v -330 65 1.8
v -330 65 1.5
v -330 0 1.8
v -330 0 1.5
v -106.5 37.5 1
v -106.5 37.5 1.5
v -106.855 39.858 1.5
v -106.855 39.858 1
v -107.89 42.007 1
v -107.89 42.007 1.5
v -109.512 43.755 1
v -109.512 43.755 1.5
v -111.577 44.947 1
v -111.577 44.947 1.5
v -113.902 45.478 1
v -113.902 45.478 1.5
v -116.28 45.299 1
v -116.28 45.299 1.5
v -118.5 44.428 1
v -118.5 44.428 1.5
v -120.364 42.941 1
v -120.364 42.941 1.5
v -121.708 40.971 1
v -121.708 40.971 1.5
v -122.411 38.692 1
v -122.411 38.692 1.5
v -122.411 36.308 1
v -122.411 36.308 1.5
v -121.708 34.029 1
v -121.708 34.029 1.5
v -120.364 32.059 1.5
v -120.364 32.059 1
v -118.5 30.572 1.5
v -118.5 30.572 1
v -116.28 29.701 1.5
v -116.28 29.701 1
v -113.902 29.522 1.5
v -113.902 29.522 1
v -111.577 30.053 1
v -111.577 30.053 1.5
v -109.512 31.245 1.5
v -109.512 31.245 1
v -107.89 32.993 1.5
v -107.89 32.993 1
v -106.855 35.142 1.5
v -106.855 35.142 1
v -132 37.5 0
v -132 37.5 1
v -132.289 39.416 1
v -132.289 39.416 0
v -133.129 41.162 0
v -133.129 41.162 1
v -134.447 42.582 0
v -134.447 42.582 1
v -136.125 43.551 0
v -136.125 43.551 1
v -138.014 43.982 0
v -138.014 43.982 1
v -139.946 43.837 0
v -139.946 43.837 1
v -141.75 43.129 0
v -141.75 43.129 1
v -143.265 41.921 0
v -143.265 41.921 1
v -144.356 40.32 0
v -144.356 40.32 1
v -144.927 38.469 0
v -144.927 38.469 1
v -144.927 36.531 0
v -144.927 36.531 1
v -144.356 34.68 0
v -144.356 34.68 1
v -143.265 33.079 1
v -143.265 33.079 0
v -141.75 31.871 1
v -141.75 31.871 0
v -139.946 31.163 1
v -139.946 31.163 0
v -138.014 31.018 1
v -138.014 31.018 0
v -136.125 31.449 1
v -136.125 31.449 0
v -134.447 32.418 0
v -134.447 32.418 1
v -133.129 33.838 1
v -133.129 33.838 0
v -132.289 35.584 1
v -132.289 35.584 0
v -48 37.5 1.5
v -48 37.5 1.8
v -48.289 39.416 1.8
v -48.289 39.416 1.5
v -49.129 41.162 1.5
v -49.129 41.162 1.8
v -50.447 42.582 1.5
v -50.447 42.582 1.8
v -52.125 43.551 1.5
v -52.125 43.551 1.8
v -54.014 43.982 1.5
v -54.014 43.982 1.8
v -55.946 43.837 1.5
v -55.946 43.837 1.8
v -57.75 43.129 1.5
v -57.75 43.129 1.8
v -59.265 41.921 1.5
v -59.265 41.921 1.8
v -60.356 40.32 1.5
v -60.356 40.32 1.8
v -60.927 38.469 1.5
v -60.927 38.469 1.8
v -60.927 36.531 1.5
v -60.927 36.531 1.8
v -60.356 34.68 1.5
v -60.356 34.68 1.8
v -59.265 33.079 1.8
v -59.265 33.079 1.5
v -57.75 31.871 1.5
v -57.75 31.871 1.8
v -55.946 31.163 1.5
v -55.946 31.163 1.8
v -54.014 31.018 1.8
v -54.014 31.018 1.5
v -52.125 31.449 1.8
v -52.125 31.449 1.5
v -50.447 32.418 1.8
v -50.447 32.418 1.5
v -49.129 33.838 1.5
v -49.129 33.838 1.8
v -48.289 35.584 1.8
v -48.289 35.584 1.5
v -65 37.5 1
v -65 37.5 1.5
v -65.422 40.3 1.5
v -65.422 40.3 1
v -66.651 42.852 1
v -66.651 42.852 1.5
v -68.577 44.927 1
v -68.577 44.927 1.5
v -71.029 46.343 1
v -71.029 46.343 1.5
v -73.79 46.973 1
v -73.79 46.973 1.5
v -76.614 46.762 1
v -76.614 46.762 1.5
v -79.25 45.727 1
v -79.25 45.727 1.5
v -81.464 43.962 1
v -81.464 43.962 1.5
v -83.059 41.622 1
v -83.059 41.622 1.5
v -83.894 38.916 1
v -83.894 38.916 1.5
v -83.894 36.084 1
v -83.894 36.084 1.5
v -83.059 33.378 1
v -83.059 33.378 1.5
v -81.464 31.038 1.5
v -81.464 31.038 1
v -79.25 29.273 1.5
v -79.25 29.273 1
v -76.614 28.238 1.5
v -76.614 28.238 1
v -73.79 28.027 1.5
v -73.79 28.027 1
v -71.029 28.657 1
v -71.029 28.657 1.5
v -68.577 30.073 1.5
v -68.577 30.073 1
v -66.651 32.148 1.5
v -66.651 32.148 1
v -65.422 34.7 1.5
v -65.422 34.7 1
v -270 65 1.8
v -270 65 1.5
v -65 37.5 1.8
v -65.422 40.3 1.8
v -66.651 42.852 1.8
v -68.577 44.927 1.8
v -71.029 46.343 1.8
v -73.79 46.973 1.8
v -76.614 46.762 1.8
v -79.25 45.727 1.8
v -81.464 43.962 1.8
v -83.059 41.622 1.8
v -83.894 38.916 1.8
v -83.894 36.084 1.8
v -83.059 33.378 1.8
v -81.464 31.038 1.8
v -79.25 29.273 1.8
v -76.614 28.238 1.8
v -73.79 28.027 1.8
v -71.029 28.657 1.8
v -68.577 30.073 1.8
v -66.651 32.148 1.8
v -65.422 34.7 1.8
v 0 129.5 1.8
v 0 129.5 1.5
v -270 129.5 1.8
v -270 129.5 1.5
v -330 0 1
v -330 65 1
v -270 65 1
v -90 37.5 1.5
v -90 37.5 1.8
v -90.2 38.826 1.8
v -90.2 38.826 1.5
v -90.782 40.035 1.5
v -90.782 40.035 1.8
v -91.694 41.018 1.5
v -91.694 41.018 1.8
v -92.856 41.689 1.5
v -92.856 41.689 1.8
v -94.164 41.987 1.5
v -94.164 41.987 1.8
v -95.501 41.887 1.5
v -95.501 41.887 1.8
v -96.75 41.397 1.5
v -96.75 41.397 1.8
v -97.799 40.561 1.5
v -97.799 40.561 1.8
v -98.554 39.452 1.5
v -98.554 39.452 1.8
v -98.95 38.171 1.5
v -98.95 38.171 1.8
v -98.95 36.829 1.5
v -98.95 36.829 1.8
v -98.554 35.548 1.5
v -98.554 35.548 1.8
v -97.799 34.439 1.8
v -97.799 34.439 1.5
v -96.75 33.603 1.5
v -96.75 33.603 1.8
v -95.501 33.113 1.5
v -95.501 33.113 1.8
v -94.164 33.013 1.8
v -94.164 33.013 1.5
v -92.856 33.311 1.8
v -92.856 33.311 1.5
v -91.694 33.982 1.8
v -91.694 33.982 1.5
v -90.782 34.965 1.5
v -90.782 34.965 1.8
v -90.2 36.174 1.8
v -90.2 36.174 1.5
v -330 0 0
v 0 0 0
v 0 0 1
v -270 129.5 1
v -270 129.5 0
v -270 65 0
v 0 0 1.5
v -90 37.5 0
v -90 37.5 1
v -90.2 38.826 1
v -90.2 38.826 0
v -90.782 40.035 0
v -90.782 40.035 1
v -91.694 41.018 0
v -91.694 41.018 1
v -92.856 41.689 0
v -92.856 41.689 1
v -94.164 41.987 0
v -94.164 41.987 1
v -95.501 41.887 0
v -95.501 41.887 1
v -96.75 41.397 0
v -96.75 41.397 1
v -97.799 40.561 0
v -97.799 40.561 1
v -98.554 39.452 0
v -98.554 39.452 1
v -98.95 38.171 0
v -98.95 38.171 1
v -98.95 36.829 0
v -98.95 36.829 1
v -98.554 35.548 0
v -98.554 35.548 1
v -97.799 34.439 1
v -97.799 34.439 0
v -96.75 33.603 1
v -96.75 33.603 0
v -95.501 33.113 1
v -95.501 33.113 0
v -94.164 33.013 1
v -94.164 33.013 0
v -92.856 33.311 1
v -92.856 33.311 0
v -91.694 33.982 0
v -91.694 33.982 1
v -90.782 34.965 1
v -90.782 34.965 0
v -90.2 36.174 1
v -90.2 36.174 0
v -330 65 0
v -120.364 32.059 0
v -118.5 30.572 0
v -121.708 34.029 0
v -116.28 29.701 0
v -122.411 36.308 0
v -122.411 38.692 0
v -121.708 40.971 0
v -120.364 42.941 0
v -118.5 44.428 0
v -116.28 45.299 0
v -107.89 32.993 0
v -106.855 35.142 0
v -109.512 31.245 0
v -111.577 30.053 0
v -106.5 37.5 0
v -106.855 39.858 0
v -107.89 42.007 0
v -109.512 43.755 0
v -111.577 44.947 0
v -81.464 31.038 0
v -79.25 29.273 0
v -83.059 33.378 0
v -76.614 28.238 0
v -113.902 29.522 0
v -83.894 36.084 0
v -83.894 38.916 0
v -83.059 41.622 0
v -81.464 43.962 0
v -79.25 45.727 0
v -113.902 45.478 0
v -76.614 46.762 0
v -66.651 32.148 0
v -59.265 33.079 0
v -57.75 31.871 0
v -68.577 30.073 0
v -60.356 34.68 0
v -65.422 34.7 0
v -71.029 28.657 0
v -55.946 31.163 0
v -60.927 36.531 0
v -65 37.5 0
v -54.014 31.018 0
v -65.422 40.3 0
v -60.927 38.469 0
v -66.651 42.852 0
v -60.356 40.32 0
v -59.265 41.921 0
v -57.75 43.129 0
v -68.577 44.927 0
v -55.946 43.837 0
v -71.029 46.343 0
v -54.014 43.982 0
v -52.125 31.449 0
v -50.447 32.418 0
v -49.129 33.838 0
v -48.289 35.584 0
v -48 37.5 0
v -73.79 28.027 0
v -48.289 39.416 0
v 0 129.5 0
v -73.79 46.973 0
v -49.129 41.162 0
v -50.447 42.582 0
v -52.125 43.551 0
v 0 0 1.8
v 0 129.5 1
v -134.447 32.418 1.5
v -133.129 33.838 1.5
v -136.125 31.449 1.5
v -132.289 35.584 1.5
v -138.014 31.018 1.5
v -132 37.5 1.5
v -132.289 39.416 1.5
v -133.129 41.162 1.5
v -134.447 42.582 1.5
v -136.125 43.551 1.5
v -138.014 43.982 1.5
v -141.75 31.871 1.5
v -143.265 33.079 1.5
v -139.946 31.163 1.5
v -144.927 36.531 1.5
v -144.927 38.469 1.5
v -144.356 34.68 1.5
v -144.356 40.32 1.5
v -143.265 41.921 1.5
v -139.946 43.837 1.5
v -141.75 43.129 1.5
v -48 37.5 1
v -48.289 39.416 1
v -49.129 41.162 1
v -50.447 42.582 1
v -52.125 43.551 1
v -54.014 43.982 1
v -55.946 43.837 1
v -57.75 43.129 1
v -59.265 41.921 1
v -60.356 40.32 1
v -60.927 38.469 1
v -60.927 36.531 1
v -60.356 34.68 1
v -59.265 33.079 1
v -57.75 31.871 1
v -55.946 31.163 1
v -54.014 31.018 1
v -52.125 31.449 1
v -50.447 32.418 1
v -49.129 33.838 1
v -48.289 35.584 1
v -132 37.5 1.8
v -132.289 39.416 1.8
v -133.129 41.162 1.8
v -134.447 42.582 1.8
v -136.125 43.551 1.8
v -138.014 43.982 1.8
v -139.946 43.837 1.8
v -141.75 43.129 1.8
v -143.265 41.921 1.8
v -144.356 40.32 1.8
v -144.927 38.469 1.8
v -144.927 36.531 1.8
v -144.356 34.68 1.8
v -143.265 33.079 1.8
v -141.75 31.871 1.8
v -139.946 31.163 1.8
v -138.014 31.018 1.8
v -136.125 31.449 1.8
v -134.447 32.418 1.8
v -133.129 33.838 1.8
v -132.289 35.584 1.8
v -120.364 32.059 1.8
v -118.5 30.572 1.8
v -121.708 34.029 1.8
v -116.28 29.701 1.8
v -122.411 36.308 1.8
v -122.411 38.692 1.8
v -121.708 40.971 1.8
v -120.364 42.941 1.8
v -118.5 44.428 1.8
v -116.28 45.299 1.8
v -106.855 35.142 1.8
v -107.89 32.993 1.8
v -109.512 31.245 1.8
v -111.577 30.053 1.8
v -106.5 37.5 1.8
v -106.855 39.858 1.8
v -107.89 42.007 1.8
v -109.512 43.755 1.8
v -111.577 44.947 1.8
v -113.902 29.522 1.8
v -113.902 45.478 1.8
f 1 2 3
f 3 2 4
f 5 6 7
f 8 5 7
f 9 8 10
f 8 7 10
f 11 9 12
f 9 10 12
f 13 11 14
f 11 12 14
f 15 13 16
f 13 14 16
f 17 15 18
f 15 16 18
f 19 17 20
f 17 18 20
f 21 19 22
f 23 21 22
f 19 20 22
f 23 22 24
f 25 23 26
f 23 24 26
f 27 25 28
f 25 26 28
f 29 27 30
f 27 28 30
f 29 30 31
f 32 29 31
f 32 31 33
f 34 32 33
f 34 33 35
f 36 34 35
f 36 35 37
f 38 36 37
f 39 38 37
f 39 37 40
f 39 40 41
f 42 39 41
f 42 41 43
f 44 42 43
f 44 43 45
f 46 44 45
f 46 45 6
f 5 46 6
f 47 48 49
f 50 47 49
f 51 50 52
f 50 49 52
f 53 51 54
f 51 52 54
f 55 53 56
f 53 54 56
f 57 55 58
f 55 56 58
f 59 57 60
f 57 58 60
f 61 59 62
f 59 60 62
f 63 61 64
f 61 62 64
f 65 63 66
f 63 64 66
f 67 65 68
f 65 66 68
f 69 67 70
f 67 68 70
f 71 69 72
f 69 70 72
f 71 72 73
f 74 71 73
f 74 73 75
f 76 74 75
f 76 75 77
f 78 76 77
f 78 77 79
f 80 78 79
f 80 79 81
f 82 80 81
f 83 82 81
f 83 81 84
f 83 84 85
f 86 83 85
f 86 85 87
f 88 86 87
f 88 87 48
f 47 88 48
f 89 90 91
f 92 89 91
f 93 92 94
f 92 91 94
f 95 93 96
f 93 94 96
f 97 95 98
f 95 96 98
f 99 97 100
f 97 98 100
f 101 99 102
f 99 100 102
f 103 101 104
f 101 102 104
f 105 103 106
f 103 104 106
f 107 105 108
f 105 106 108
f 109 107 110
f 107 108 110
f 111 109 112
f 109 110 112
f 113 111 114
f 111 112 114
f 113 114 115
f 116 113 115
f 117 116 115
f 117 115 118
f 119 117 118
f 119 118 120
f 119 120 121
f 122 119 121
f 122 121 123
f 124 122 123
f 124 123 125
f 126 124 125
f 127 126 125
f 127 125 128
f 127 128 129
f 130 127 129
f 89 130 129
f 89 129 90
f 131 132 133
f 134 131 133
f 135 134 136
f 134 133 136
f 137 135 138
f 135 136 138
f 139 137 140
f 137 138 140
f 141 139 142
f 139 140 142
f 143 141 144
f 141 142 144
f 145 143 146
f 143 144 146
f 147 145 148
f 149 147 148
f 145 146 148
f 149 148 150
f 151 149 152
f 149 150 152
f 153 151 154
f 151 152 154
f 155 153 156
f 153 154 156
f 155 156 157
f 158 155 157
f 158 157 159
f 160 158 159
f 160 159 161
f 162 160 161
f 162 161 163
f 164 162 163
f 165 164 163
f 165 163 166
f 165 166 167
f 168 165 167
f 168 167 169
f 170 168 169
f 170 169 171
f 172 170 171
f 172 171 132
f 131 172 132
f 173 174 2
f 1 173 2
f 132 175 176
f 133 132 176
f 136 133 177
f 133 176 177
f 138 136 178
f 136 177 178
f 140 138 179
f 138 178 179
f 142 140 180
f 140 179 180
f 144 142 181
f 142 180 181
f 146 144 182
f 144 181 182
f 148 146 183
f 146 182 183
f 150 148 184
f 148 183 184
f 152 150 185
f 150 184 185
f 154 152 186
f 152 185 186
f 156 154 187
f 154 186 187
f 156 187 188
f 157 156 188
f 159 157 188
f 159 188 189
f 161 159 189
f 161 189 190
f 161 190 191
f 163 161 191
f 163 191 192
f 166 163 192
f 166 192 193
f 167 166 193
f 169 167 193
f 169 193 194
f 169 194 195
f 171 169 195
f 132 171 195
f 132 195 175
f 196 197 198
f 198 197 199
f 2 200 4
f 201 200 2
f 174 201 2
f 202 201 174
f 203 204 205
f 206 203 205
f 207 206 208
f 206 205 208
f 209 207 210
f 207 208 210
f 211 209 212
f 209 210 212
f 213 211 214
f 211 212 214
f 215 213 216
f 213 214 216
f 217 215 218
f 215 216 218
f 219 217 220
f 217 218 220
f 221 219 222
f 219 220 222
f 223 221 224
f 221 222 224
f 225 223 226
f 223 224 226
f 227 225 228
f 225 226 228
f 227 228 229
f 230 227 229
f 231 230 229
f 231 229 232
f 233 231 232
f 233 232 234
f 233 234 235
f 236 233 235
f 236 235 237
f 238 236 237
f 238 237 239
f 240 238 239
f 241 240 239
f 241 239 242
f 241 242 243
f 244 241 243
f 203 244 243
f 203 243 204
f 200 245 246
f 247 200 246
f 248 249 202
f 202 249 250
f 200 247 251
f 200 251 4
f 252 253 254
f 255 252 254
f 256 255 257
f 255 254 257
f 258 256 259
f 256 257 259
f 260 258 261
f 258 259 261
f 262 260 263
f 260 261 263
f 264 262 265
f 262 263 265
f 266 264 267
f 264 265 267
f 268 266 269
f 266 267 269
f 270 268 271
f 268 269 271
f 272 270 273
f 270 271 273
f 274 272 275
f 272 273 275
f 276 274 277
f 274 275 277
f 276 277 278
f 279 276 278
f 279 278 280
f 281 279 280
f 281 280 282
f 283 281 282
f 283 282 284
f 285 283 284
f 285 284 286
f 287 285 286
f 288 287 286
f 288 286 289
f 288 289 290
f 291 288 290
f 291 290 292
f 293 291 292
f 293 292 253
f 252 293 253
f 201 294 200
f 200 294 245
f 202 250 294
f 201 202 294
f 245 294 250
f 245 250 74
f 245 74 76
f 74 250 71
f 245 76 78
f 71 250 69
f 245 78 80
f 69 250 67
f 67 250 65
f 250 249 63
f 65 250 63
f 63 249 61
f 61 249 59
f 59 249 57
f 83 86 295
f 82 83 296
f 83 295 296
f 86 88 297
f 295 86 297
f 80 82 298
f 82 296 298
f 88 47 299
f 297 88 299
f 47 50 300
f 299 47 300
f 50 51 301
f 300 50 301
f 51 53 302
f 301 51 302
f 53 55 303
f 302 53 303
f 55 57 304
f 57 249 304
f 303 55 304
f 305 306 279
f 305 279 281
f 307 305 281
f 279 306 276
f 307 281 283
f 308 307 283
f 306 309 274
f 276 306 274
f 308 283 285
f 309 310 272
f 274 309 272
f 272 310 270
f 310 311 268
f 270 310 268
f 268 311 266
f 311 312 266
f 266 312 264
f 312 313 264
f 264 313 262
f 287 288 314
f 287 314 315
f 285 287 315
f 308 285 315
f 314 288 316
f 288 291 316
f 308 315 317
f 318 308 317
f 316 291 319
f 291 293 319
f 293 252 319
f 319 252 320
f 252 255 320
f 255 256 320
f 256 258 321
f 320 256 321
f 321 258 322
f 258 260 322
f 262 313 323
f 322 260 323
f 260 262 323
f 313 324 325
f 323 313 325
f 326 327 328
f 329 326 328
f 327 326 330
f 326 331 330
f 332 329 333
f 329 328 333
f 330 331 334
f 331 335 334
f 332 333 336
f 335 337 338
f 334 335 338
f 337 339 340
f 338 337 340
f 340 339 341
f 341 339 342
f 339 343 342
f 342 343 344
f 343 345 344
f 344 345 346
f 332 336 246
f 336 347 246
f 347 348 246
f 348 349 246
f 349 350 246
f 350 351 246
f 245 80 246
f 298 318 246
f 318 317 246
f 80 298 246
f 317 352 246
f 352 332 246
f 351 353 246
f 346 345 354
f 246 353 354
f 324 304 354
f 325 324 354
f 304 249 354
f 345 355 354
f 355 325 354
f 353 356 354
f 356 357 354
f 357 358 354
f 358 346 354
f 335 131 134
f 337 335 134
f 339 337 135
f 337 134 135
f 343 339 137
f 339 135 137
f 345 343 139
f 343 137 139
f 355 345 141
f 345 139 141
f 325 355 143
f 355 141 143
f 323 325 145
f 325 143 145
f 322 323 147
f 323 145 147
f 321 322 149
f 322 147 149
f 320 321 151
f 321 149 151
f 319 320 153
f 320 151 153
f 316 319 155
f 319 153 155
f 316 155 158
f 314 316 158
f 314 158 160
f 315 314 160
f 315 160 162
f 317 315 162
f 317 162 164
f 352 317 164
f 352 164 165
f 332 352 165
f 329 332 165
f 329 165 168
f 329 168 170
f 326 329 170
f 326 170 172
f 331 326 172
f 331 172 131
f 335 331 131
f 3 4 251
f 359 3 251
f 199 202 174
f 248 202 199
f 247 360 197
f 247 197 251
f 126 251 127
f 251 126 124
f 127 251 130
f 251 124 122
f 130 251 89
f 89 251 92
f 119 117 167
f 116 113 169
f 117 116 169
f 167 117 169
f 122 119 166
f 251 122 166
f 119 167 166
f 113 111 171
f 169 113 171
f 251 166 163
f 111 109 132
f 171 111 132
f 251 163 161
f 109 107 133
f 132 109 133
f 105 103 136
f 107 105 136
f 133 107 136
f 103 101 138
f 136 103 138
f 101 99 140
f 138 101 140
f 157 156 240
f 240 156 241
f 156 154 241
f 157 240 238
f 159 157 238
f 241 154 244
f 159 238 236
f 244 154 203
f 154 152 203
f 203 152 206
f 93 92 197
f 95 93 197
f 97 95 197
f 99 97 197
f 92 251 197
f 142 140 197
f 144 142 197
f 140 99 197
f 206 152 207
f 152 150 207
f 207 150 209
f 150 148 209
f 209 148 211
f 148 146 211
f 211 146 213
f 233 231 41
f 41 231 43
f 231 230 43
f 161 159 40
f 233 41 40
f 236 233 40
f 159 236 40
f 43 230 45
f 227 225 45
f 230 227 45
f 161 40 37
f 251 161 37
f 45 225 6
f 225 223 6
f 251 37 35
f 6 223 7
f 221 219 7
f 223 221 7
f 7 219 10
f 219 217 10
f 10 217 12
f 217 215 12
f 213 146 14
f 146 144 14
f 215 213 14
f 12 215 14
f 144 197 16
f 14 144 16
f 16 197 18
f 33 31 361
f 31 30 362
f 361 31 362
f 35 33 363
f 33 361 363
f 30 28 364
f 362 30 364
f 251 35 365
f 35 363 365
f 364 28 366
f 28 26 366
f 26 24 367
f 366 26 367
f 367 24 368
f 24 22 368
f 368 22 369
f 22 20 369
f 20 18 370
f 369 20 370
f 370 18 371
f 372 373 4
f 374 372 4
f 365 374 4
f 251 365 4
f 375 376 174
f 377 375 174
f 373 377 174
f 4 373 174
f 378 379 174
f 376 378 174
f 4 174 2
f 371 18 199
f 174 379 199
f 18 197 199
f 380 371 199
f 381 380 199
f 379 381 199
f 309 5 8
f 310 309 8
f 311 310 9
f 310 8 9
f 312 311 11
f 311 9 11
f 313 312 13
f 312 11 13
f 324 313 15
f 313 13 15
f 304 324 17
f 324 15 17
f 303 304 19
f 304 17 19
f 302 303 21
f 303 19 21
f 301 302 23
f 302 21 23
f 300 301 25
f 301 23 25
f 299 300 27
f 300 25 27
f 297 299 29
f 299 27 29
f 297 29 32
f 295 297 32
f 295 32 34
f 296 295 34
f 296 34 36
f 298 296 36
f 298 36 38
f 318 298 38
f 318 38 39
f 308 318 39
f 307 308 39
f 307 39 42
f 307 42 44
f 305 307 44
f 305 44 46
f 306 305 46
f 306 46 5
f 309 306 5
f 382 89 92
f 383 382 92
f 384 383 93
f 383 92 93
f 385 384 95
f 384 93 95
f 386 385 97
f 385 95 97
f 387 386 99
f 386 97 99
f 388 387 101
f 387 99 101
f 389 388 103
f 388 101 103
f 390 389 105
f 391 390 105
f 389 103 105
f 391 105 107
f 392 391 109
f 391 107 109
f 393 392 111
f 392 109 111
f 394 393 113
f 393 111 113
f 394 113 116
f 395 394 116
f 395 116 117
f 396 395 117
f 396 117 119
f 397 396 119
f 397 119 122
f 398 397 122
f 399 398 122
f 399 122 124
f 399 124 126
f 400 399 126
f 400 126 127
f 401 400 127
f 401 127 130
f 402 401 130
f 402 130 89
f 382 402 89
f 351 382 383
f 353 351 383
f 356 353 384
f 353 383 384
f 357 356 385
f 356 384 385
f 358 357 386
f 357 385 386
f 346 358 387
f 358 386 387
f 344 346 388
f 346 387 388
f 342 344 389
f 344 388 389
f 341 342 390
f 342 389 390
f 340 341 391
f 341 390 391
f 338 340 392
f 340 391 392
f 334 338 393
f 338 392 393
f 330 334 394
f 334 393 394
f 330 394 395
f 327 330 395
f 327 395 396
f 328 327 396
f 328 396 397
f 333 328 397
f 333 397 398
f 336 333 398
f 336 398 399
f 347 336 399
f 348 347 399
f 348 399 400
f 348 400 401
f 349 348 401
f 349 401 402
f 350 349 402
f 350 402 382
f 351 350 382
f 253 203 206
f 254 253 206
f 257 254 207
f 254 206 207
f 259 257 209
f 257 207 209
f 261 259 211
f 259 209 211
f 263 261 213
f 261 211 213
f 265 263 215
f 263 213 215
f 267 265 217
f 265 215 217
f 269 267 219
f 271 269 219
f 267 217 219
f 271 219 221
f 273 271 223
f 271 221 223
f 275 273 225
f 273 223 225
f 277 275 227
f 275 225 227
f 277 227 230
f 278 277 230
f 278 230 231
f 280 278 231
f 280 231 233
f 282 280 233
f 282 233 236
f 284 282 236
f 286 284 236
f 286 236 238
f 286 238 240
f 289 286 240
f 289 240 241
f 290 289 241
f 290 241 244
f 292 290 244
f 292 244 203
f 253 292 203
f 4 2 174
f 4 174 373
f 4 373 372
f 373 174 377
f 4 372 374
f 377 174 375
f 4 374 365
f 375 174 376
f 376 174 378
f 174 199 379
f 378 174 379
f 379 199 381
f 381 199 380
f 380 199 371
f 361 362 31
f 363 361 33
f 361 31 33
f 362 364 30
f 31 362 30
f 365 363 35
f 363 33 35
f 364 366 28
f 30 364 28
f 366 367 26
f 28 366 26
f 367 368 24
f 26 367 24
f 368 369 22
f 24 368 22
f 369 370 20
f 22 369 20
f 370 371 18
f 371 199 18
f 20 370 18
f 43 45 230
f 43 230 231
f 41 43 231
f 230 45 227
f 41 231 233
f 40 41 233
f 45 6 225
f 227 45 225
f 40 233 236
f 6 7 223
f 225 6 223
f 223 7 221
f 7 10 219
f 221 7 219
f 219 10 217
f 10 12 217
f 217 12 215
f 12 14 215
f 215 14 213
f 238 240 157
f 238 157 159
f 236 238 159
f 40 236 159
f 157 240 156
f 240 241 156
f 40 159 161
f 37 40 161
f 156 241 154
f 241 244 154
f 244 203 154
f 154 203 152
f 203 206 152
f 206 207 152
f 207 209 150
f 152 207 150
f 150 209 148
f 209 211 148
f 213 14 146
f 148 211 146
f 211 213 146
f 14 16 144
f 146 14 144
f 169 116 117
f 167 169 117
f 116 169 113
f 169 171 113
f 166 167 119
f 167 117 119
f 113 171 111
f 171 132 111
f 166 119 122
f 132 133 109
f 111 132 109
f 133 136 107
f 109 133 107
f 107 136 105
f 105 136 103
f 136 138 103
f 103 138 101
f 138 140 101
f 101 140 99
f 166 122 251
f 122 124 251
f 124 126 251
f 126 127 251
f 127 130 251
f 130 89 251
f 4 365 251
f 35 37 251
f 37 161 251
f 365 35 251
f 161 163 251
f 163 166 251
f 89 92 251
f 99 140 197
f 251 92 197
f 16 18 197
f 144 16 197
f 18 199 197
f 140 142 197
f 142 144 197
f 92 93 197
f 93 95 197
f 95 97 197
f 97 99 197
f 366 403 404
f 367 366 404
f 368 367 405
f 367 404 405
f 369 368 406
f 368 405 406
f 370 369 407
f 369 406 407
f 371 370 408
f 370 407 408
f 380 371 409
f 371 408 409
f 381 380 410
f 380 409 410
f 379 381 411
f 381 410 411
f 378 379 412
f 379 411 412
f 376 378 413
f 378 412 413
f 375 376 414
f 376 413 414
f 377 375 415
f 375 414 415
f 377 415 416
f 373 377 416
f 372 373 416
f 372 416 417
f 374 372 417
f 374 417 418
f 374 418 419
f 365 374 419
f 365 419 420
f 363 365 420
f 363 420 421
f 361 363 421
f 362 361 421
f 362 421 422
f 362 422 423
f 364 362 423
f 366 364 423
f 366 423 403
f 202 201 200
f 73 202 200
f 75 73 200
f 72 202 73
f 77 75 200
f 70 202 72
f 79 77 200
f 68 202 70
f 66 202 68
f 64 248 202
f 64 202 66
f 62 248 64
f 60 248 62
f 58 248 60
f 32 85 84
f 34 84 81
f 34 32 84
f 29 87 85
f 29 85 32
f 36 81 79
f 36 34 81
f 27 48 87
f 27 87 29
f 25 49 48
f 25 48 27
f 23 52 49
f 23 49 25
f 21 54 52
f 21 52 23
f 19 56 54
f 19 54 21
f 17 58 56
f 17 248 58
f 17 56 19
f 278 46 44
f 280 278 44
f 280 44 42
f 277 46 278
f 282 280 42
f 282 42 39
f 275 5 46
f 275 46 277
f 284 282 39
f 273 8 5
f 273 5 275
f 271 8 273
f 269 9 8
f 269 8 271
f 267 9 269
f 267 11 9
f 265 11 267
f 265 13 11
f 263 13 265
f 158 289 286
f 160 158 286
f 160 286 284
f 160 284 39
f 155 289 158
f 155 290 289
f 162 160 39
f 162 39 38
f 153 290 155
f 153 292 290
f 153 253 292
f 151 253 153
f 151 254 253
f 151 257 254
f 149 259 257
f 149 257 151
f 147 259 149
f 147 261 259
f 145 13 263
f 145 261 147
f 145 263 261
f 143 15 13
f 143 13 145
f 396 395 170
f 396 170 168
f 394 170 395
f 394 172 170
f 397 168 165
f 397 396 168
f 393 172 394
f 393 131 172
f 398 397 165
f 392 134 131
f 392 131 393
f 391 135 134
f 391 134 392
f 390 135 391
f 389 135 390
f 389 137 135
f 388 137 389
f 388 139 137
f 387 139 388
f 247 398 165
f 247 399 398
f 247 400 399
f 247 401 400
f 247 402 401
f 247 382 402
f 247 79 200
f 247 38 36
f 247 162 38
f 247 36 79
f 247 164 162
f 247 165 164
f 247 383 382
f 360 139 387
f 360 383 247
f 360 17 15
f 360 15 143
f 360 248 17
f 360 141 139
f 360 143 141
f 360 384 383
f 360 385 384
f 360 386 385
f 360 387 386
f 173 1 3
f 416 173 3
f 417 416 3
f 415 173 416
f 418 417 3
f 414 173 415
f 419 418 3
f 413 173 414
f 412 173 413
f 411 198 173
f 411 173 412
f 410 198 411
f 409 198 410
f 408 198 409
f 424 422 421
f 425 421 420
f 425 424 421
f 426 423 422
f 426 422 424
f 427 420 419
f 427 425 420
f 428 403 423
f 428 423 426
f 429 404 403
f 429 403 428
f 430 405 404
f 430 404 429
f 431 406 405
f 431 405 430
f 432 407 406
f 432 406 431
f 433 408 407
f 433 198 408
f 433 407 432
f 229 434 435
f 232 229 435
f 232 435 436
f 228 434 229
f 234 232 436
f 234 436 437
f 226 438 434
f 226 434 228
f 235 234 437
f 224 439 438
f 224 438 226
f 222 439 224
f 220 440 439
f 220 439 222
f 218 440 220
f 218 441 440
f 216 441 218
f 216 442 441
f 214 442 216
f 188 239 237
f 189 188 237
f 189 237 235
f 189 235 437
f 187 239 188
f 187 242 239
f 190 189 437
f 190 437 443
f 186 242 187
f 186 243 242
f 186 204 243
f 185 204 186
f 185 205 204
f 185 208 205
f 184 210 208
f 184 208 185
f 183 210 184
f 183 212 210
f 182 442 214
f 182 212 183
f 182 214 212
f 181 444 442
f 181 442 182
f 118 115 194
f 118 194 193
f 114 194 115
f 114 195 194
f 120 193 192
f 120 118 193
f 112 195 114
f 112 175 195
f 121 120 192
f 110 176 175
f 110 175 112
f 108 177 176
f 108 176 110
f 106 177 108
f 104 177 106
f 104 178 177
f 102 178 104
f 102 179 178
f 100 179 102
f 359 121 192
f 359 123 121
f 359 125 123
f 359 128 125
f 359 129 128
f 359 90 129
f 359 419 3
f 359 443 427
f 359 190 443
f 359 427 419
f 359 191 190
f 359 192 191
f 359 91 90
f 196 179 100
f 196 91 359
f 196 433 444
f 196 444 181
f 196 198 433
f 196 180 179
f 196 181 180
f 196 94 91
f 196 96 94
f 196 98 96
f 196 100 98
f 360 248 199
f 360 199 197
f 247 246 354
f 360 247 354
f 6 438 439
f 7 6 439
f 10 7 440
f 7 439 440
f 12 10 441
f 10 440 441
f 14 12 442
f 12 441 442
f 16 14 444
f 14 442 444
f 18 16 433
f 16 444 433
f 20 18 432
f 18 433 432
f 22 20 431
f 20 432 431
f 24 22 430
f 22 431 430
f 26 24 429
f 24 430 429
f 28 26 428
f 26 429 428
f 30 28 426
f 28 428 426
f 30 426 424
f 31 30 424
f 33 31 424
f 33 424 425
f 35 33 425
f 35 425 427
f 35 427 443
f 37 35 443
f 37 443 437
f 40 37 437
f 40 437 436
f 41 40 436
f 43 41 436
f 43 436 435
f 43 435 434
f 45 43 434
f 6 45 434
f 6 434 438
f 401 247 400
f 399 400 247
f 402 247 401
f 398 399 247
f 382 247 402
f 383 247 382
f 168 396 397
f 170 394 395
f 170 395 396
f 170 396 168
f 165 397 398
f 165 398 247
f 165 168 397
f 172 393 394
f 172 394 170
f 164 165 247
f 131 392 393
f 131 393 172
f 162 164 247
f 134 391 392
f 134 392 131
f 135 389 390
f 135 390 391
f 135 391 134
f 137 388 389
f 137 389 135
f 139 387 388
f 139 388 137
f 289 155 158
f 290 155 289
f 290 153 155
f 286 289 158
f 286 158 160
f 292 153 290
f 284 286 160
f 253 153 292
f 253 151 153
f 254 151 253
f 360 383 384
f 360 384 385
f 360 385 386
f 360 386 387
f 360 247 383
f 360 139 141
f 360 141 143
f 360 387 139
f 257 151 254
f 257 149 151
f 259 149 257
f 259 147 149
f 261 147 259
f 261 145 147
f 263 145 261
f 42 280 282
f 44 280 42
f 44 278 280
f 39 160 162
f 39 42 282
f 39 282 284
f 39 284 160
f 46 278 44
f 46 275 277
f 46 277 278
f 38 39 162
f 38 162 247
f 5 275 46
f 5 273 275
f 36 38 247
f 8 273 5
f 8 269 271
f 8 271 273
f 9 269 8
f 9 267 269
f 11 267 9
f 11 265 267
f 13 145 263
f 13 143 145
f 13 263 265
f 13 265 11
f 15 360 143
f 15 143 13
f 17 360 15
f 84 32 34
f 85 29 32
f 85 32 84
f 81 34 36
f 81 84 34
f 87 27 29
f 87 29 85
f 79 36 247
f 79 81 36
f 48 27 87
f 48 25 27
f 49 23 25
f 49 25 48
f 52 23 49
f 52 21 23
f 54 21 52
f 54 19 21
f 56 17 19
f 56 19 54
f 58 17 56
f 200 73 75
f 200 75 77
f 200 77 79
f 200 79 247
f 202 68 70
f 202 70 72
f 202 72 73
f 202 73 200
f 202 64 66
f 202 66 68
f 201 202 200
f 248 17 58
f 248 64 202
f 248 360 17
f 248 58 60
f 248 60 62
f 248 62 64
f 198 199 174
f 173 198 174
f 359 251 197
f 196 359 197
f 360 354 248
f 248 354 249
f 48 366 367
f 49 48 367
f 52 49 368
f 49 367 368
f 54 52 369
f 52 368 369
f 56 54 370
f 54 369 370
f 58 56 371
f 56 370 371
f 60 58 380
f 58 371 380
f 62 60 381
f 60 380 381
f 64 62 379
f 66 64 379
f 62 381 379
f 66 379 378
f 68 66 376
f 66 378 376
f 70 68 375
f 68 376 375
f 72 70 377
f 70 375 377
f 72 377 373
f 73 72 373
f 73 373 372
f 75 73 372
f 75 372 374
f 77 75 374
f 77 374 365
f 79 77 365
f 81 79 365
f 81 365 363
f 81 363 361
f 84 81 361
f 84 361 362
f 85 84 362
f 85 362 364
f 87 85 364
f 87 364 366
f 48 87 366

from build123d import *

# Parameters (mm, degrees)
DODANIE_WYCI_GNI_CIE1_DEPTH = 1
DODANIE_WYCI_GNI_CIE2_DEPTH = 0.5
DODANIE_WYCI_GNI_CIE3_DEPTH = 0.3
SZKIC4_R                    = 9.5
SZKIC4_R_2                  = 4.5
SZKIC4_R_3                  = 8
SZKIC4_R_4                  = 6.5
WYTNIJ_WYCI_GNI_CIE1_DEPTH  = 2.8


with BuildPart() as part:
    # Szkic1 → Dodanie-wyciągnięcie1 (new body)
    with BuildSketch(Plane.XY):
        Polygon((0, 0), (0, 129.5), (-270, 129.5), (-270, 65), (-330, 65), (-330, 0), align=None)
    extrude(amount=DODANIE_WYCI_GNI_CIE1_DEPTH)


with BuildPart() as body_2:
    # Szkic2 → Dodanie-wyciągnięcie2 (new body)
    with BuildSketch(Plane.XY.offset(1)):
        Polygon((0, 0), (-330, 0), (-330, 65), (-270, 65), (-270, 129.5), (0, 129.5), align=None)
    extrude(amount=DODANIE_WYCI_GNI_CIE2_DEPTH)


with BuildPart() as body_3:
    # Szkic3 → Dodanie-wyciągnięcie3 (new body)
    with BuildSketch(Plane.XY.offset(1.5)):
        Polygon((0, 0), (0, 129.5), (-270, 129.5), (-270, 65), (-330, 65), (-330, 0), align=None)
    extrude(amount=DODANIE_WYCI_GNI_CIE3_DEPTH)


with BuildPart() as wytnij_wyci_gni_cie1_tool:
    # Szkic4 → Wytnij-wyciągnięcie1 (new body, through all)
    with BuildSketch(Plane.XY.offset(1.8)):
        with Locations((-74.5, 37.5)):
            Circle(SZKIC4_R)
        with Locations((-94.5, 37.5)):
            Circle(SZKIC4_R_2)
        with Locations((-114.5, 37.5)):
            Circle(SZKIC4_R_3)
        with Locations((-138.5, 37.5)):
            Circle(SZKIC4_R_4)
        with Locations((-54.5, 37.5)):
            Circle(SZKIC4_R_4)
    extrude(amount=-WYTNIJ_WYCI_GNI_CIE1_DEPTH)


with BuildPart() as part_1:
    add(part.part)

    # Wytnij-wyciągnięcie1: cut by wytnij_wyci_gni_cie1_tool
    add(wytnij_wyci_gni_cie1_tool.part, mode=Mode.SUBTRACT)


with BuildPart() as body_2_1:
    add(body_2.part)

    # Wytnij-wyciągnięcie1: cut by wytnij_wyci_gni_cie1_tool
    add(wytnij_wyci_gni_cie1_tool.part, mode=Mode.SUBTRACT)


with BuildPart() as body_3_1:
    add(body_3.part)

    # Wytnij-wyciągnięcie1: cut by wytnij_wyci_gni_cie1_tool
    add(wytnij_wyci_gni_cie1_tool.part, mode=Mode.SUBTRACT)


solid = Compound([part_1.part, body_2_1.part, body_3_1.part])
